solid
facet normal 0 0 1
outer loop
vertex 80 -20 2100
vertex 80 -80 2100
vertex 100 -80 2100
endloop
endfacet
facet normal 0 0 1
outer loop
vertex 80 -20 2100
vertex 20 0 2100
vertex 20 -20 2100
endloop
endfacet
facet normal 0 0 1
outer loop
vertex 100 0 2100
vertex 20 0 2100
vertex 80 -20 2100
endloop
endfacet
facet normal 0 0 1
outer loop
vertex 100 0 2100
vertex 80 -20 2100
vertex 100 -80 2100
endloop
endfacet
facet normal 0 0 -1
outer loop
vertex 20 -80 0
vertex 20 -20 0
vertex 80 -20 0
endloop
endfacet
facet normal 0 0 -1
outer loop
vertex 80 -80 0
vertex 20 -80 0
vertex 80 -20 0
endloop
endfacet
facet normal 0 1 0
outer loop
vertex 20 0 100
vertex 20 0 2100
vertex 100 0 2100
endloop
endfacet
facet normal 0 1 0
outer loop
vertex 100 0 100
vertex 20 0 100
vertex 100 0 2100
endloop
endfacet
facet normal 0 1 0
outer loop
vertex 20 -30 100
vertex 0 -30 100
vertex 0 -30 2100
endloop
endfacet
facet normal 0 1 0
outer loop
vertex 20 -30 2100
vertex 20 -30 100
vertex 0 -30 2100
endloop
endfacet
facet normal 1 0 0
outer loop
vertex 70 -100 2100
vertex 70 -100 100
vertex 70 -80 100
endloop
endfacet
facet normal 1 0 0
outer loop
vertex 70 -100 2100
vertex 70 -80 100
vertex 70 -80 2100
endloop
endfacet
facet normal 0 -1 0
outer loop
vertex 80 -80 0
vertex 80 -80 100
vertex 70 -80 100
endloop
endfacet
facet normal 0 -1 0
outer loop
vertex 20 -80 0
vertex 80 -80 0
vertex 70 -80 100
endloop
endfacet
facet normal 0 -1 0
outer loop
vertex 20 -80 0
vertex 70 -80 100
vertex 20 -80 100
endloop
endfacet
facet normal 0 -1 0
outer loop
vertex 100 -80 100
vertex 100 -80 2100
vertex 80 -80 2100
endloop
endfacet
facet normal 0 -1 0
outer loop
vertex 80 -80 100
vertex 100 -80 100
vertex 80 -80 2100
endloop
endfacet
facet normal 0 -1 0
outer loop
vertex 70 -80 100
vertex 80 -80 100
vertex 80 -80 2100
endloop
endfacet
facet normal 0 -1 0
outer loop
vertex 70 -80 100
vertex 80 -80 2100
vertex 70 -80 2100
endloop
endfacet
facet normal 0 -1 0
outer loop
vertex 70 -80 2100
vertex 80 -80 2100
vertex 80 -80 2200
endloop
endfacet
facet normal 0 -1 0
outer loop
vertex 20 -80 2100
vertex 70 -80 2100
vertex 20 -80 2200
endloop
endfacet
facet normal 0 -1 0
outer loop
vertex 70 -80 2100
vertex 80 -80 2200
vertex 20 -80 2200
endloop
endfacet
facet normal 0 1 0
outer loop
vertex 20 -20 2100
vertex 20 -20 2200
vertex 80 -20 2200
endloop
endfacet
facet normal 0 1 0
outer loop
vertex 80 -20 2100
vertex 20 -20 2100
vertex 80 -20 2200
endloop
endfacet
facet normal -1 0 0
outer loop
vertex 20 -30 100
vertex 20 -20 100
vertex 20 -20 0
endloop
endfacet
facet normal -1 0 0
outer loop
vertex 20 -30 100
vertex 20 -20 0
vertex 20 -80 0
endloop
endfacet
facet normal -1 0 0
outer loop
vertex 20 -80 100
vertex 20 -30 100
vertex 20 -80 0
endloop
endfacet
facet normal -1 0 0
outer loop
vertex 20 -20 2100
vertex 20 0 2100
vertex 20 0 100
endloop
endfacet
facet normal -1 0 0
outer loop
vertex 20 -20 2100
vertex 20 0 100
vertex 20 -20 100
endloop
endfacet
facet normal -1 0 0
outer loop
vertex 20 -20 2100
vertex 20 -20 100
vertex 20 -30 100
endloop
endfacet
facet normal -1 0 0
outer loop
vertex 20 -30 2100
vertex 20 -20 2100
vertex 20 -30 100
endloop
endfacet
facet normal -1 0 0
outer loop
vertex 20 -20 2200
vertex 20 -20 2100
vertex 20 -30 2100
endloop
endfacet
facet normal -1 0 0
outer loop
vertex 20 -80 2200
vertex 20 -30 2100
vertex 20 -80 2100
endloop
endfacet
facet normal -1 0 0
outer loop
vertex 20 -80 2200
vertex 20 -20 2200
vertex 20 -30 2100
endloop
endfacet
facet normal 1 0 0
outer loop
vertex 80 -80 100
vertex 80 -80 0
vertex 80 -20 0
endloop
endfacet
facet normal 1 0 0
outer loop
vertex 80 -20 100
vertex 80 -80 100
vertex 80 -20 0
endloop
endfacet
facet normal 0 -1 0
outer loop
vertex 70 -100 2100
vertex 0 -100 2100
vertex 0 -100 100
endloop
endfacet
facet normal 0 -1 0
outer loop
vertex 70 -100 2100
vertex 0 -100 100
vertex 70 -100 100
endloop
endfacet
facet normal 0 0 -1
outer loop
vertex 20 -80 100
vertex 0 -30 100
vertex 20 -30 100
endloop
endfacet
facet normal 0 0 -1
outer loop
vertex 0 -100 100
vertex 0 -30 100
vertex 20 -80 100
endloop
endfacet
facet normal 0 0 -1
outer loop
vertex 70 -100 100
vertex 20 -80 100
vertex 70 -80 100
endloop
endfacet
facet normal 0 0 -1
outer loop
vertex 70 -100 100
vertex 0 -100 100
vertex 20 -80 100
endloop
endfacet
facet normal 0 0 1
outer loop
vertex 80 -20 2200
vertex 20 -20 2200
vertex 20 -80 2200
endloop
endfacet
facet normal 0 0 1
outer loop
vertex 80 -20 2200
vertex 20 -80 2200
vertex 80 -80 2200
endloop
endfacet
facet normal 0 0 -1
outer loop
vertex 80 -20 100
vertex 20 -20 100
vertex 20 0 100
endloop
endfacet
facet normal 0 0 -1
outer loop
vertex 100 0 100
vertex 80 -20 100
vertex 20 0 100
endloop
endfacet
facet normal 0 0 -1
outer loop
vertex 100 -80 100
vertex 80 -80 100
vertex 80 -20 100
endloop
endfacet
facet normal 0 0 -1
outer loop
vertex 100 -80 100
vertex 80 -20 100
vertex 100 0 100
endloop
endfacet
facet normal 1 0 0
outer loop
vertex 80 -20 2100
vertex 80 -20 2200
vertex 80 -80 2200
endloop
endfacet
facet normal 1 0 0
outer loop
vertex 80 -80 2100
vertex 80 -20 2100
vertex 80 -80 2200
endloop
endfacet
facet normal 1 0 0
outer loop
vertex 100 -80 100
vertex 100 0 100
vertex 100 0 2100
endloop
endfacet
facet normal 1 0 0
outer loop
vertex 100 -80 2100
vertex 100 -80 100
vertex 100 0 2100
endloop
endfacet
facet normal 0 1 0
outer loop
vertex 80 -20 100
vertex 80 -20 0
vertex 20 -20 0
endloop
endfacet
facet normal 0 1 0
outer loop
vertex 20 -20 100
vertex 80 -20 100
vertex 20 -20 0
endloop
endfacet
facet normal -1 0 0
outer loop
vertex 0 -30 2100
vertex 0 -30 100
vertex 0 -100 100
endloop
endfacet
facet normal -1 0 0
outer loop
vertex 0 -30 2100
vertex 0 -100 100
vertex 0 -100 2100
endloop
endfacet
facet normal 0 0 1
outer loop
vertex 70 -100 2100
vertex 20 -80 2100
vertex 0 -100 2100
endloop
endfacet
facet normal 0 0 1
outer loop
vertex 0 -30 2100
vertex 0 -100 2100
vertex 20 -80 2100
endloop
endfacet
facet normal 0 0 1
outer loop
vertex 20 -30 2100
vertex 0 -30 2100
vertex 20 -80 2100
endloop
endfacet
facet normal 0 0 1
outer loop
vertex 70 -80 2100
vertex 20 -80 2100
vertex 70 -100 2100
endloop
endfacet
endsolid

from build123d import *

# Parameters (mm, degrees)
F0_W     = 100
F0_H     = 2200
F1_DEPTH = 100
F2_W     = 30
F2_H     = 2200
F3_DEPTH = 20
F4_W     = 30
F4_H     = 2200
F5_DEPTH = 20
F7_DEPTH = 100
F9_DEPTH = 100


with BuildPart() as f1:
    # F0 (on Front) → F1 (new body)
    with BuildSketch(Plane.XZ):
        with Locations((50, 1100)):
            Rectangle(F0_W, F0_H)
    extrude(amount=F1_DEPTH)

    # F2 (on face) → F3 (cut)
    with BuildSketch(Plane.XZ.offset(100)):
        with Locations((85, 1100)):
            Rectangle(F2_W, F2_H)
    extrude(amount=-F3_DEPTH, mode=Mode.SUBTRACT)

    # F4 (on face) → F5 (cut)
    with BuildSketch(Plane(origin=(0, 0, 0), x_dir=(0, -1, 0), z_dir=(-1, 0, 0))):
        with Locations((15, 1100)):
            Rectangle(F4_W, F4_H)
    extrude(amount=-F5_DEPTH, mode=Mode.SUBTRACT)

    # F6 (on face) → F7 (cut)
    with BuildSketch(Plane.XY.offset(2200)):
        Polygon((20, -20), (80, -20), (80, -80), (100, -80), (100, 0), (20, 0), align=None)
        Polygon((20, -80), (20, -30), (0, -30), (0, -100), (70, -100), (70, -80), align=None)
    extrude(amount=-F7_DEPTH, mode=Mode.SUBTRACT)

    # F8 (on face) → F9 (cut)
    with BuildSketch(Plane(origin=(0, 0, 0), x_dir=(1, 0, 0), z_dir=(0, 0, -1))):
        Polygon((0, 30), (20, 30), (20, 80), (70, 80), (70, 100), (0, 100), align=None)
        Polygon((80, 20), (20, 20), (20, 0), (100, 0), (100, 80), (80, 80), align=None)
    extrude(amount=-F9_DEPTH, mode=Mode.SUBTRACT)


solid = f1.part
